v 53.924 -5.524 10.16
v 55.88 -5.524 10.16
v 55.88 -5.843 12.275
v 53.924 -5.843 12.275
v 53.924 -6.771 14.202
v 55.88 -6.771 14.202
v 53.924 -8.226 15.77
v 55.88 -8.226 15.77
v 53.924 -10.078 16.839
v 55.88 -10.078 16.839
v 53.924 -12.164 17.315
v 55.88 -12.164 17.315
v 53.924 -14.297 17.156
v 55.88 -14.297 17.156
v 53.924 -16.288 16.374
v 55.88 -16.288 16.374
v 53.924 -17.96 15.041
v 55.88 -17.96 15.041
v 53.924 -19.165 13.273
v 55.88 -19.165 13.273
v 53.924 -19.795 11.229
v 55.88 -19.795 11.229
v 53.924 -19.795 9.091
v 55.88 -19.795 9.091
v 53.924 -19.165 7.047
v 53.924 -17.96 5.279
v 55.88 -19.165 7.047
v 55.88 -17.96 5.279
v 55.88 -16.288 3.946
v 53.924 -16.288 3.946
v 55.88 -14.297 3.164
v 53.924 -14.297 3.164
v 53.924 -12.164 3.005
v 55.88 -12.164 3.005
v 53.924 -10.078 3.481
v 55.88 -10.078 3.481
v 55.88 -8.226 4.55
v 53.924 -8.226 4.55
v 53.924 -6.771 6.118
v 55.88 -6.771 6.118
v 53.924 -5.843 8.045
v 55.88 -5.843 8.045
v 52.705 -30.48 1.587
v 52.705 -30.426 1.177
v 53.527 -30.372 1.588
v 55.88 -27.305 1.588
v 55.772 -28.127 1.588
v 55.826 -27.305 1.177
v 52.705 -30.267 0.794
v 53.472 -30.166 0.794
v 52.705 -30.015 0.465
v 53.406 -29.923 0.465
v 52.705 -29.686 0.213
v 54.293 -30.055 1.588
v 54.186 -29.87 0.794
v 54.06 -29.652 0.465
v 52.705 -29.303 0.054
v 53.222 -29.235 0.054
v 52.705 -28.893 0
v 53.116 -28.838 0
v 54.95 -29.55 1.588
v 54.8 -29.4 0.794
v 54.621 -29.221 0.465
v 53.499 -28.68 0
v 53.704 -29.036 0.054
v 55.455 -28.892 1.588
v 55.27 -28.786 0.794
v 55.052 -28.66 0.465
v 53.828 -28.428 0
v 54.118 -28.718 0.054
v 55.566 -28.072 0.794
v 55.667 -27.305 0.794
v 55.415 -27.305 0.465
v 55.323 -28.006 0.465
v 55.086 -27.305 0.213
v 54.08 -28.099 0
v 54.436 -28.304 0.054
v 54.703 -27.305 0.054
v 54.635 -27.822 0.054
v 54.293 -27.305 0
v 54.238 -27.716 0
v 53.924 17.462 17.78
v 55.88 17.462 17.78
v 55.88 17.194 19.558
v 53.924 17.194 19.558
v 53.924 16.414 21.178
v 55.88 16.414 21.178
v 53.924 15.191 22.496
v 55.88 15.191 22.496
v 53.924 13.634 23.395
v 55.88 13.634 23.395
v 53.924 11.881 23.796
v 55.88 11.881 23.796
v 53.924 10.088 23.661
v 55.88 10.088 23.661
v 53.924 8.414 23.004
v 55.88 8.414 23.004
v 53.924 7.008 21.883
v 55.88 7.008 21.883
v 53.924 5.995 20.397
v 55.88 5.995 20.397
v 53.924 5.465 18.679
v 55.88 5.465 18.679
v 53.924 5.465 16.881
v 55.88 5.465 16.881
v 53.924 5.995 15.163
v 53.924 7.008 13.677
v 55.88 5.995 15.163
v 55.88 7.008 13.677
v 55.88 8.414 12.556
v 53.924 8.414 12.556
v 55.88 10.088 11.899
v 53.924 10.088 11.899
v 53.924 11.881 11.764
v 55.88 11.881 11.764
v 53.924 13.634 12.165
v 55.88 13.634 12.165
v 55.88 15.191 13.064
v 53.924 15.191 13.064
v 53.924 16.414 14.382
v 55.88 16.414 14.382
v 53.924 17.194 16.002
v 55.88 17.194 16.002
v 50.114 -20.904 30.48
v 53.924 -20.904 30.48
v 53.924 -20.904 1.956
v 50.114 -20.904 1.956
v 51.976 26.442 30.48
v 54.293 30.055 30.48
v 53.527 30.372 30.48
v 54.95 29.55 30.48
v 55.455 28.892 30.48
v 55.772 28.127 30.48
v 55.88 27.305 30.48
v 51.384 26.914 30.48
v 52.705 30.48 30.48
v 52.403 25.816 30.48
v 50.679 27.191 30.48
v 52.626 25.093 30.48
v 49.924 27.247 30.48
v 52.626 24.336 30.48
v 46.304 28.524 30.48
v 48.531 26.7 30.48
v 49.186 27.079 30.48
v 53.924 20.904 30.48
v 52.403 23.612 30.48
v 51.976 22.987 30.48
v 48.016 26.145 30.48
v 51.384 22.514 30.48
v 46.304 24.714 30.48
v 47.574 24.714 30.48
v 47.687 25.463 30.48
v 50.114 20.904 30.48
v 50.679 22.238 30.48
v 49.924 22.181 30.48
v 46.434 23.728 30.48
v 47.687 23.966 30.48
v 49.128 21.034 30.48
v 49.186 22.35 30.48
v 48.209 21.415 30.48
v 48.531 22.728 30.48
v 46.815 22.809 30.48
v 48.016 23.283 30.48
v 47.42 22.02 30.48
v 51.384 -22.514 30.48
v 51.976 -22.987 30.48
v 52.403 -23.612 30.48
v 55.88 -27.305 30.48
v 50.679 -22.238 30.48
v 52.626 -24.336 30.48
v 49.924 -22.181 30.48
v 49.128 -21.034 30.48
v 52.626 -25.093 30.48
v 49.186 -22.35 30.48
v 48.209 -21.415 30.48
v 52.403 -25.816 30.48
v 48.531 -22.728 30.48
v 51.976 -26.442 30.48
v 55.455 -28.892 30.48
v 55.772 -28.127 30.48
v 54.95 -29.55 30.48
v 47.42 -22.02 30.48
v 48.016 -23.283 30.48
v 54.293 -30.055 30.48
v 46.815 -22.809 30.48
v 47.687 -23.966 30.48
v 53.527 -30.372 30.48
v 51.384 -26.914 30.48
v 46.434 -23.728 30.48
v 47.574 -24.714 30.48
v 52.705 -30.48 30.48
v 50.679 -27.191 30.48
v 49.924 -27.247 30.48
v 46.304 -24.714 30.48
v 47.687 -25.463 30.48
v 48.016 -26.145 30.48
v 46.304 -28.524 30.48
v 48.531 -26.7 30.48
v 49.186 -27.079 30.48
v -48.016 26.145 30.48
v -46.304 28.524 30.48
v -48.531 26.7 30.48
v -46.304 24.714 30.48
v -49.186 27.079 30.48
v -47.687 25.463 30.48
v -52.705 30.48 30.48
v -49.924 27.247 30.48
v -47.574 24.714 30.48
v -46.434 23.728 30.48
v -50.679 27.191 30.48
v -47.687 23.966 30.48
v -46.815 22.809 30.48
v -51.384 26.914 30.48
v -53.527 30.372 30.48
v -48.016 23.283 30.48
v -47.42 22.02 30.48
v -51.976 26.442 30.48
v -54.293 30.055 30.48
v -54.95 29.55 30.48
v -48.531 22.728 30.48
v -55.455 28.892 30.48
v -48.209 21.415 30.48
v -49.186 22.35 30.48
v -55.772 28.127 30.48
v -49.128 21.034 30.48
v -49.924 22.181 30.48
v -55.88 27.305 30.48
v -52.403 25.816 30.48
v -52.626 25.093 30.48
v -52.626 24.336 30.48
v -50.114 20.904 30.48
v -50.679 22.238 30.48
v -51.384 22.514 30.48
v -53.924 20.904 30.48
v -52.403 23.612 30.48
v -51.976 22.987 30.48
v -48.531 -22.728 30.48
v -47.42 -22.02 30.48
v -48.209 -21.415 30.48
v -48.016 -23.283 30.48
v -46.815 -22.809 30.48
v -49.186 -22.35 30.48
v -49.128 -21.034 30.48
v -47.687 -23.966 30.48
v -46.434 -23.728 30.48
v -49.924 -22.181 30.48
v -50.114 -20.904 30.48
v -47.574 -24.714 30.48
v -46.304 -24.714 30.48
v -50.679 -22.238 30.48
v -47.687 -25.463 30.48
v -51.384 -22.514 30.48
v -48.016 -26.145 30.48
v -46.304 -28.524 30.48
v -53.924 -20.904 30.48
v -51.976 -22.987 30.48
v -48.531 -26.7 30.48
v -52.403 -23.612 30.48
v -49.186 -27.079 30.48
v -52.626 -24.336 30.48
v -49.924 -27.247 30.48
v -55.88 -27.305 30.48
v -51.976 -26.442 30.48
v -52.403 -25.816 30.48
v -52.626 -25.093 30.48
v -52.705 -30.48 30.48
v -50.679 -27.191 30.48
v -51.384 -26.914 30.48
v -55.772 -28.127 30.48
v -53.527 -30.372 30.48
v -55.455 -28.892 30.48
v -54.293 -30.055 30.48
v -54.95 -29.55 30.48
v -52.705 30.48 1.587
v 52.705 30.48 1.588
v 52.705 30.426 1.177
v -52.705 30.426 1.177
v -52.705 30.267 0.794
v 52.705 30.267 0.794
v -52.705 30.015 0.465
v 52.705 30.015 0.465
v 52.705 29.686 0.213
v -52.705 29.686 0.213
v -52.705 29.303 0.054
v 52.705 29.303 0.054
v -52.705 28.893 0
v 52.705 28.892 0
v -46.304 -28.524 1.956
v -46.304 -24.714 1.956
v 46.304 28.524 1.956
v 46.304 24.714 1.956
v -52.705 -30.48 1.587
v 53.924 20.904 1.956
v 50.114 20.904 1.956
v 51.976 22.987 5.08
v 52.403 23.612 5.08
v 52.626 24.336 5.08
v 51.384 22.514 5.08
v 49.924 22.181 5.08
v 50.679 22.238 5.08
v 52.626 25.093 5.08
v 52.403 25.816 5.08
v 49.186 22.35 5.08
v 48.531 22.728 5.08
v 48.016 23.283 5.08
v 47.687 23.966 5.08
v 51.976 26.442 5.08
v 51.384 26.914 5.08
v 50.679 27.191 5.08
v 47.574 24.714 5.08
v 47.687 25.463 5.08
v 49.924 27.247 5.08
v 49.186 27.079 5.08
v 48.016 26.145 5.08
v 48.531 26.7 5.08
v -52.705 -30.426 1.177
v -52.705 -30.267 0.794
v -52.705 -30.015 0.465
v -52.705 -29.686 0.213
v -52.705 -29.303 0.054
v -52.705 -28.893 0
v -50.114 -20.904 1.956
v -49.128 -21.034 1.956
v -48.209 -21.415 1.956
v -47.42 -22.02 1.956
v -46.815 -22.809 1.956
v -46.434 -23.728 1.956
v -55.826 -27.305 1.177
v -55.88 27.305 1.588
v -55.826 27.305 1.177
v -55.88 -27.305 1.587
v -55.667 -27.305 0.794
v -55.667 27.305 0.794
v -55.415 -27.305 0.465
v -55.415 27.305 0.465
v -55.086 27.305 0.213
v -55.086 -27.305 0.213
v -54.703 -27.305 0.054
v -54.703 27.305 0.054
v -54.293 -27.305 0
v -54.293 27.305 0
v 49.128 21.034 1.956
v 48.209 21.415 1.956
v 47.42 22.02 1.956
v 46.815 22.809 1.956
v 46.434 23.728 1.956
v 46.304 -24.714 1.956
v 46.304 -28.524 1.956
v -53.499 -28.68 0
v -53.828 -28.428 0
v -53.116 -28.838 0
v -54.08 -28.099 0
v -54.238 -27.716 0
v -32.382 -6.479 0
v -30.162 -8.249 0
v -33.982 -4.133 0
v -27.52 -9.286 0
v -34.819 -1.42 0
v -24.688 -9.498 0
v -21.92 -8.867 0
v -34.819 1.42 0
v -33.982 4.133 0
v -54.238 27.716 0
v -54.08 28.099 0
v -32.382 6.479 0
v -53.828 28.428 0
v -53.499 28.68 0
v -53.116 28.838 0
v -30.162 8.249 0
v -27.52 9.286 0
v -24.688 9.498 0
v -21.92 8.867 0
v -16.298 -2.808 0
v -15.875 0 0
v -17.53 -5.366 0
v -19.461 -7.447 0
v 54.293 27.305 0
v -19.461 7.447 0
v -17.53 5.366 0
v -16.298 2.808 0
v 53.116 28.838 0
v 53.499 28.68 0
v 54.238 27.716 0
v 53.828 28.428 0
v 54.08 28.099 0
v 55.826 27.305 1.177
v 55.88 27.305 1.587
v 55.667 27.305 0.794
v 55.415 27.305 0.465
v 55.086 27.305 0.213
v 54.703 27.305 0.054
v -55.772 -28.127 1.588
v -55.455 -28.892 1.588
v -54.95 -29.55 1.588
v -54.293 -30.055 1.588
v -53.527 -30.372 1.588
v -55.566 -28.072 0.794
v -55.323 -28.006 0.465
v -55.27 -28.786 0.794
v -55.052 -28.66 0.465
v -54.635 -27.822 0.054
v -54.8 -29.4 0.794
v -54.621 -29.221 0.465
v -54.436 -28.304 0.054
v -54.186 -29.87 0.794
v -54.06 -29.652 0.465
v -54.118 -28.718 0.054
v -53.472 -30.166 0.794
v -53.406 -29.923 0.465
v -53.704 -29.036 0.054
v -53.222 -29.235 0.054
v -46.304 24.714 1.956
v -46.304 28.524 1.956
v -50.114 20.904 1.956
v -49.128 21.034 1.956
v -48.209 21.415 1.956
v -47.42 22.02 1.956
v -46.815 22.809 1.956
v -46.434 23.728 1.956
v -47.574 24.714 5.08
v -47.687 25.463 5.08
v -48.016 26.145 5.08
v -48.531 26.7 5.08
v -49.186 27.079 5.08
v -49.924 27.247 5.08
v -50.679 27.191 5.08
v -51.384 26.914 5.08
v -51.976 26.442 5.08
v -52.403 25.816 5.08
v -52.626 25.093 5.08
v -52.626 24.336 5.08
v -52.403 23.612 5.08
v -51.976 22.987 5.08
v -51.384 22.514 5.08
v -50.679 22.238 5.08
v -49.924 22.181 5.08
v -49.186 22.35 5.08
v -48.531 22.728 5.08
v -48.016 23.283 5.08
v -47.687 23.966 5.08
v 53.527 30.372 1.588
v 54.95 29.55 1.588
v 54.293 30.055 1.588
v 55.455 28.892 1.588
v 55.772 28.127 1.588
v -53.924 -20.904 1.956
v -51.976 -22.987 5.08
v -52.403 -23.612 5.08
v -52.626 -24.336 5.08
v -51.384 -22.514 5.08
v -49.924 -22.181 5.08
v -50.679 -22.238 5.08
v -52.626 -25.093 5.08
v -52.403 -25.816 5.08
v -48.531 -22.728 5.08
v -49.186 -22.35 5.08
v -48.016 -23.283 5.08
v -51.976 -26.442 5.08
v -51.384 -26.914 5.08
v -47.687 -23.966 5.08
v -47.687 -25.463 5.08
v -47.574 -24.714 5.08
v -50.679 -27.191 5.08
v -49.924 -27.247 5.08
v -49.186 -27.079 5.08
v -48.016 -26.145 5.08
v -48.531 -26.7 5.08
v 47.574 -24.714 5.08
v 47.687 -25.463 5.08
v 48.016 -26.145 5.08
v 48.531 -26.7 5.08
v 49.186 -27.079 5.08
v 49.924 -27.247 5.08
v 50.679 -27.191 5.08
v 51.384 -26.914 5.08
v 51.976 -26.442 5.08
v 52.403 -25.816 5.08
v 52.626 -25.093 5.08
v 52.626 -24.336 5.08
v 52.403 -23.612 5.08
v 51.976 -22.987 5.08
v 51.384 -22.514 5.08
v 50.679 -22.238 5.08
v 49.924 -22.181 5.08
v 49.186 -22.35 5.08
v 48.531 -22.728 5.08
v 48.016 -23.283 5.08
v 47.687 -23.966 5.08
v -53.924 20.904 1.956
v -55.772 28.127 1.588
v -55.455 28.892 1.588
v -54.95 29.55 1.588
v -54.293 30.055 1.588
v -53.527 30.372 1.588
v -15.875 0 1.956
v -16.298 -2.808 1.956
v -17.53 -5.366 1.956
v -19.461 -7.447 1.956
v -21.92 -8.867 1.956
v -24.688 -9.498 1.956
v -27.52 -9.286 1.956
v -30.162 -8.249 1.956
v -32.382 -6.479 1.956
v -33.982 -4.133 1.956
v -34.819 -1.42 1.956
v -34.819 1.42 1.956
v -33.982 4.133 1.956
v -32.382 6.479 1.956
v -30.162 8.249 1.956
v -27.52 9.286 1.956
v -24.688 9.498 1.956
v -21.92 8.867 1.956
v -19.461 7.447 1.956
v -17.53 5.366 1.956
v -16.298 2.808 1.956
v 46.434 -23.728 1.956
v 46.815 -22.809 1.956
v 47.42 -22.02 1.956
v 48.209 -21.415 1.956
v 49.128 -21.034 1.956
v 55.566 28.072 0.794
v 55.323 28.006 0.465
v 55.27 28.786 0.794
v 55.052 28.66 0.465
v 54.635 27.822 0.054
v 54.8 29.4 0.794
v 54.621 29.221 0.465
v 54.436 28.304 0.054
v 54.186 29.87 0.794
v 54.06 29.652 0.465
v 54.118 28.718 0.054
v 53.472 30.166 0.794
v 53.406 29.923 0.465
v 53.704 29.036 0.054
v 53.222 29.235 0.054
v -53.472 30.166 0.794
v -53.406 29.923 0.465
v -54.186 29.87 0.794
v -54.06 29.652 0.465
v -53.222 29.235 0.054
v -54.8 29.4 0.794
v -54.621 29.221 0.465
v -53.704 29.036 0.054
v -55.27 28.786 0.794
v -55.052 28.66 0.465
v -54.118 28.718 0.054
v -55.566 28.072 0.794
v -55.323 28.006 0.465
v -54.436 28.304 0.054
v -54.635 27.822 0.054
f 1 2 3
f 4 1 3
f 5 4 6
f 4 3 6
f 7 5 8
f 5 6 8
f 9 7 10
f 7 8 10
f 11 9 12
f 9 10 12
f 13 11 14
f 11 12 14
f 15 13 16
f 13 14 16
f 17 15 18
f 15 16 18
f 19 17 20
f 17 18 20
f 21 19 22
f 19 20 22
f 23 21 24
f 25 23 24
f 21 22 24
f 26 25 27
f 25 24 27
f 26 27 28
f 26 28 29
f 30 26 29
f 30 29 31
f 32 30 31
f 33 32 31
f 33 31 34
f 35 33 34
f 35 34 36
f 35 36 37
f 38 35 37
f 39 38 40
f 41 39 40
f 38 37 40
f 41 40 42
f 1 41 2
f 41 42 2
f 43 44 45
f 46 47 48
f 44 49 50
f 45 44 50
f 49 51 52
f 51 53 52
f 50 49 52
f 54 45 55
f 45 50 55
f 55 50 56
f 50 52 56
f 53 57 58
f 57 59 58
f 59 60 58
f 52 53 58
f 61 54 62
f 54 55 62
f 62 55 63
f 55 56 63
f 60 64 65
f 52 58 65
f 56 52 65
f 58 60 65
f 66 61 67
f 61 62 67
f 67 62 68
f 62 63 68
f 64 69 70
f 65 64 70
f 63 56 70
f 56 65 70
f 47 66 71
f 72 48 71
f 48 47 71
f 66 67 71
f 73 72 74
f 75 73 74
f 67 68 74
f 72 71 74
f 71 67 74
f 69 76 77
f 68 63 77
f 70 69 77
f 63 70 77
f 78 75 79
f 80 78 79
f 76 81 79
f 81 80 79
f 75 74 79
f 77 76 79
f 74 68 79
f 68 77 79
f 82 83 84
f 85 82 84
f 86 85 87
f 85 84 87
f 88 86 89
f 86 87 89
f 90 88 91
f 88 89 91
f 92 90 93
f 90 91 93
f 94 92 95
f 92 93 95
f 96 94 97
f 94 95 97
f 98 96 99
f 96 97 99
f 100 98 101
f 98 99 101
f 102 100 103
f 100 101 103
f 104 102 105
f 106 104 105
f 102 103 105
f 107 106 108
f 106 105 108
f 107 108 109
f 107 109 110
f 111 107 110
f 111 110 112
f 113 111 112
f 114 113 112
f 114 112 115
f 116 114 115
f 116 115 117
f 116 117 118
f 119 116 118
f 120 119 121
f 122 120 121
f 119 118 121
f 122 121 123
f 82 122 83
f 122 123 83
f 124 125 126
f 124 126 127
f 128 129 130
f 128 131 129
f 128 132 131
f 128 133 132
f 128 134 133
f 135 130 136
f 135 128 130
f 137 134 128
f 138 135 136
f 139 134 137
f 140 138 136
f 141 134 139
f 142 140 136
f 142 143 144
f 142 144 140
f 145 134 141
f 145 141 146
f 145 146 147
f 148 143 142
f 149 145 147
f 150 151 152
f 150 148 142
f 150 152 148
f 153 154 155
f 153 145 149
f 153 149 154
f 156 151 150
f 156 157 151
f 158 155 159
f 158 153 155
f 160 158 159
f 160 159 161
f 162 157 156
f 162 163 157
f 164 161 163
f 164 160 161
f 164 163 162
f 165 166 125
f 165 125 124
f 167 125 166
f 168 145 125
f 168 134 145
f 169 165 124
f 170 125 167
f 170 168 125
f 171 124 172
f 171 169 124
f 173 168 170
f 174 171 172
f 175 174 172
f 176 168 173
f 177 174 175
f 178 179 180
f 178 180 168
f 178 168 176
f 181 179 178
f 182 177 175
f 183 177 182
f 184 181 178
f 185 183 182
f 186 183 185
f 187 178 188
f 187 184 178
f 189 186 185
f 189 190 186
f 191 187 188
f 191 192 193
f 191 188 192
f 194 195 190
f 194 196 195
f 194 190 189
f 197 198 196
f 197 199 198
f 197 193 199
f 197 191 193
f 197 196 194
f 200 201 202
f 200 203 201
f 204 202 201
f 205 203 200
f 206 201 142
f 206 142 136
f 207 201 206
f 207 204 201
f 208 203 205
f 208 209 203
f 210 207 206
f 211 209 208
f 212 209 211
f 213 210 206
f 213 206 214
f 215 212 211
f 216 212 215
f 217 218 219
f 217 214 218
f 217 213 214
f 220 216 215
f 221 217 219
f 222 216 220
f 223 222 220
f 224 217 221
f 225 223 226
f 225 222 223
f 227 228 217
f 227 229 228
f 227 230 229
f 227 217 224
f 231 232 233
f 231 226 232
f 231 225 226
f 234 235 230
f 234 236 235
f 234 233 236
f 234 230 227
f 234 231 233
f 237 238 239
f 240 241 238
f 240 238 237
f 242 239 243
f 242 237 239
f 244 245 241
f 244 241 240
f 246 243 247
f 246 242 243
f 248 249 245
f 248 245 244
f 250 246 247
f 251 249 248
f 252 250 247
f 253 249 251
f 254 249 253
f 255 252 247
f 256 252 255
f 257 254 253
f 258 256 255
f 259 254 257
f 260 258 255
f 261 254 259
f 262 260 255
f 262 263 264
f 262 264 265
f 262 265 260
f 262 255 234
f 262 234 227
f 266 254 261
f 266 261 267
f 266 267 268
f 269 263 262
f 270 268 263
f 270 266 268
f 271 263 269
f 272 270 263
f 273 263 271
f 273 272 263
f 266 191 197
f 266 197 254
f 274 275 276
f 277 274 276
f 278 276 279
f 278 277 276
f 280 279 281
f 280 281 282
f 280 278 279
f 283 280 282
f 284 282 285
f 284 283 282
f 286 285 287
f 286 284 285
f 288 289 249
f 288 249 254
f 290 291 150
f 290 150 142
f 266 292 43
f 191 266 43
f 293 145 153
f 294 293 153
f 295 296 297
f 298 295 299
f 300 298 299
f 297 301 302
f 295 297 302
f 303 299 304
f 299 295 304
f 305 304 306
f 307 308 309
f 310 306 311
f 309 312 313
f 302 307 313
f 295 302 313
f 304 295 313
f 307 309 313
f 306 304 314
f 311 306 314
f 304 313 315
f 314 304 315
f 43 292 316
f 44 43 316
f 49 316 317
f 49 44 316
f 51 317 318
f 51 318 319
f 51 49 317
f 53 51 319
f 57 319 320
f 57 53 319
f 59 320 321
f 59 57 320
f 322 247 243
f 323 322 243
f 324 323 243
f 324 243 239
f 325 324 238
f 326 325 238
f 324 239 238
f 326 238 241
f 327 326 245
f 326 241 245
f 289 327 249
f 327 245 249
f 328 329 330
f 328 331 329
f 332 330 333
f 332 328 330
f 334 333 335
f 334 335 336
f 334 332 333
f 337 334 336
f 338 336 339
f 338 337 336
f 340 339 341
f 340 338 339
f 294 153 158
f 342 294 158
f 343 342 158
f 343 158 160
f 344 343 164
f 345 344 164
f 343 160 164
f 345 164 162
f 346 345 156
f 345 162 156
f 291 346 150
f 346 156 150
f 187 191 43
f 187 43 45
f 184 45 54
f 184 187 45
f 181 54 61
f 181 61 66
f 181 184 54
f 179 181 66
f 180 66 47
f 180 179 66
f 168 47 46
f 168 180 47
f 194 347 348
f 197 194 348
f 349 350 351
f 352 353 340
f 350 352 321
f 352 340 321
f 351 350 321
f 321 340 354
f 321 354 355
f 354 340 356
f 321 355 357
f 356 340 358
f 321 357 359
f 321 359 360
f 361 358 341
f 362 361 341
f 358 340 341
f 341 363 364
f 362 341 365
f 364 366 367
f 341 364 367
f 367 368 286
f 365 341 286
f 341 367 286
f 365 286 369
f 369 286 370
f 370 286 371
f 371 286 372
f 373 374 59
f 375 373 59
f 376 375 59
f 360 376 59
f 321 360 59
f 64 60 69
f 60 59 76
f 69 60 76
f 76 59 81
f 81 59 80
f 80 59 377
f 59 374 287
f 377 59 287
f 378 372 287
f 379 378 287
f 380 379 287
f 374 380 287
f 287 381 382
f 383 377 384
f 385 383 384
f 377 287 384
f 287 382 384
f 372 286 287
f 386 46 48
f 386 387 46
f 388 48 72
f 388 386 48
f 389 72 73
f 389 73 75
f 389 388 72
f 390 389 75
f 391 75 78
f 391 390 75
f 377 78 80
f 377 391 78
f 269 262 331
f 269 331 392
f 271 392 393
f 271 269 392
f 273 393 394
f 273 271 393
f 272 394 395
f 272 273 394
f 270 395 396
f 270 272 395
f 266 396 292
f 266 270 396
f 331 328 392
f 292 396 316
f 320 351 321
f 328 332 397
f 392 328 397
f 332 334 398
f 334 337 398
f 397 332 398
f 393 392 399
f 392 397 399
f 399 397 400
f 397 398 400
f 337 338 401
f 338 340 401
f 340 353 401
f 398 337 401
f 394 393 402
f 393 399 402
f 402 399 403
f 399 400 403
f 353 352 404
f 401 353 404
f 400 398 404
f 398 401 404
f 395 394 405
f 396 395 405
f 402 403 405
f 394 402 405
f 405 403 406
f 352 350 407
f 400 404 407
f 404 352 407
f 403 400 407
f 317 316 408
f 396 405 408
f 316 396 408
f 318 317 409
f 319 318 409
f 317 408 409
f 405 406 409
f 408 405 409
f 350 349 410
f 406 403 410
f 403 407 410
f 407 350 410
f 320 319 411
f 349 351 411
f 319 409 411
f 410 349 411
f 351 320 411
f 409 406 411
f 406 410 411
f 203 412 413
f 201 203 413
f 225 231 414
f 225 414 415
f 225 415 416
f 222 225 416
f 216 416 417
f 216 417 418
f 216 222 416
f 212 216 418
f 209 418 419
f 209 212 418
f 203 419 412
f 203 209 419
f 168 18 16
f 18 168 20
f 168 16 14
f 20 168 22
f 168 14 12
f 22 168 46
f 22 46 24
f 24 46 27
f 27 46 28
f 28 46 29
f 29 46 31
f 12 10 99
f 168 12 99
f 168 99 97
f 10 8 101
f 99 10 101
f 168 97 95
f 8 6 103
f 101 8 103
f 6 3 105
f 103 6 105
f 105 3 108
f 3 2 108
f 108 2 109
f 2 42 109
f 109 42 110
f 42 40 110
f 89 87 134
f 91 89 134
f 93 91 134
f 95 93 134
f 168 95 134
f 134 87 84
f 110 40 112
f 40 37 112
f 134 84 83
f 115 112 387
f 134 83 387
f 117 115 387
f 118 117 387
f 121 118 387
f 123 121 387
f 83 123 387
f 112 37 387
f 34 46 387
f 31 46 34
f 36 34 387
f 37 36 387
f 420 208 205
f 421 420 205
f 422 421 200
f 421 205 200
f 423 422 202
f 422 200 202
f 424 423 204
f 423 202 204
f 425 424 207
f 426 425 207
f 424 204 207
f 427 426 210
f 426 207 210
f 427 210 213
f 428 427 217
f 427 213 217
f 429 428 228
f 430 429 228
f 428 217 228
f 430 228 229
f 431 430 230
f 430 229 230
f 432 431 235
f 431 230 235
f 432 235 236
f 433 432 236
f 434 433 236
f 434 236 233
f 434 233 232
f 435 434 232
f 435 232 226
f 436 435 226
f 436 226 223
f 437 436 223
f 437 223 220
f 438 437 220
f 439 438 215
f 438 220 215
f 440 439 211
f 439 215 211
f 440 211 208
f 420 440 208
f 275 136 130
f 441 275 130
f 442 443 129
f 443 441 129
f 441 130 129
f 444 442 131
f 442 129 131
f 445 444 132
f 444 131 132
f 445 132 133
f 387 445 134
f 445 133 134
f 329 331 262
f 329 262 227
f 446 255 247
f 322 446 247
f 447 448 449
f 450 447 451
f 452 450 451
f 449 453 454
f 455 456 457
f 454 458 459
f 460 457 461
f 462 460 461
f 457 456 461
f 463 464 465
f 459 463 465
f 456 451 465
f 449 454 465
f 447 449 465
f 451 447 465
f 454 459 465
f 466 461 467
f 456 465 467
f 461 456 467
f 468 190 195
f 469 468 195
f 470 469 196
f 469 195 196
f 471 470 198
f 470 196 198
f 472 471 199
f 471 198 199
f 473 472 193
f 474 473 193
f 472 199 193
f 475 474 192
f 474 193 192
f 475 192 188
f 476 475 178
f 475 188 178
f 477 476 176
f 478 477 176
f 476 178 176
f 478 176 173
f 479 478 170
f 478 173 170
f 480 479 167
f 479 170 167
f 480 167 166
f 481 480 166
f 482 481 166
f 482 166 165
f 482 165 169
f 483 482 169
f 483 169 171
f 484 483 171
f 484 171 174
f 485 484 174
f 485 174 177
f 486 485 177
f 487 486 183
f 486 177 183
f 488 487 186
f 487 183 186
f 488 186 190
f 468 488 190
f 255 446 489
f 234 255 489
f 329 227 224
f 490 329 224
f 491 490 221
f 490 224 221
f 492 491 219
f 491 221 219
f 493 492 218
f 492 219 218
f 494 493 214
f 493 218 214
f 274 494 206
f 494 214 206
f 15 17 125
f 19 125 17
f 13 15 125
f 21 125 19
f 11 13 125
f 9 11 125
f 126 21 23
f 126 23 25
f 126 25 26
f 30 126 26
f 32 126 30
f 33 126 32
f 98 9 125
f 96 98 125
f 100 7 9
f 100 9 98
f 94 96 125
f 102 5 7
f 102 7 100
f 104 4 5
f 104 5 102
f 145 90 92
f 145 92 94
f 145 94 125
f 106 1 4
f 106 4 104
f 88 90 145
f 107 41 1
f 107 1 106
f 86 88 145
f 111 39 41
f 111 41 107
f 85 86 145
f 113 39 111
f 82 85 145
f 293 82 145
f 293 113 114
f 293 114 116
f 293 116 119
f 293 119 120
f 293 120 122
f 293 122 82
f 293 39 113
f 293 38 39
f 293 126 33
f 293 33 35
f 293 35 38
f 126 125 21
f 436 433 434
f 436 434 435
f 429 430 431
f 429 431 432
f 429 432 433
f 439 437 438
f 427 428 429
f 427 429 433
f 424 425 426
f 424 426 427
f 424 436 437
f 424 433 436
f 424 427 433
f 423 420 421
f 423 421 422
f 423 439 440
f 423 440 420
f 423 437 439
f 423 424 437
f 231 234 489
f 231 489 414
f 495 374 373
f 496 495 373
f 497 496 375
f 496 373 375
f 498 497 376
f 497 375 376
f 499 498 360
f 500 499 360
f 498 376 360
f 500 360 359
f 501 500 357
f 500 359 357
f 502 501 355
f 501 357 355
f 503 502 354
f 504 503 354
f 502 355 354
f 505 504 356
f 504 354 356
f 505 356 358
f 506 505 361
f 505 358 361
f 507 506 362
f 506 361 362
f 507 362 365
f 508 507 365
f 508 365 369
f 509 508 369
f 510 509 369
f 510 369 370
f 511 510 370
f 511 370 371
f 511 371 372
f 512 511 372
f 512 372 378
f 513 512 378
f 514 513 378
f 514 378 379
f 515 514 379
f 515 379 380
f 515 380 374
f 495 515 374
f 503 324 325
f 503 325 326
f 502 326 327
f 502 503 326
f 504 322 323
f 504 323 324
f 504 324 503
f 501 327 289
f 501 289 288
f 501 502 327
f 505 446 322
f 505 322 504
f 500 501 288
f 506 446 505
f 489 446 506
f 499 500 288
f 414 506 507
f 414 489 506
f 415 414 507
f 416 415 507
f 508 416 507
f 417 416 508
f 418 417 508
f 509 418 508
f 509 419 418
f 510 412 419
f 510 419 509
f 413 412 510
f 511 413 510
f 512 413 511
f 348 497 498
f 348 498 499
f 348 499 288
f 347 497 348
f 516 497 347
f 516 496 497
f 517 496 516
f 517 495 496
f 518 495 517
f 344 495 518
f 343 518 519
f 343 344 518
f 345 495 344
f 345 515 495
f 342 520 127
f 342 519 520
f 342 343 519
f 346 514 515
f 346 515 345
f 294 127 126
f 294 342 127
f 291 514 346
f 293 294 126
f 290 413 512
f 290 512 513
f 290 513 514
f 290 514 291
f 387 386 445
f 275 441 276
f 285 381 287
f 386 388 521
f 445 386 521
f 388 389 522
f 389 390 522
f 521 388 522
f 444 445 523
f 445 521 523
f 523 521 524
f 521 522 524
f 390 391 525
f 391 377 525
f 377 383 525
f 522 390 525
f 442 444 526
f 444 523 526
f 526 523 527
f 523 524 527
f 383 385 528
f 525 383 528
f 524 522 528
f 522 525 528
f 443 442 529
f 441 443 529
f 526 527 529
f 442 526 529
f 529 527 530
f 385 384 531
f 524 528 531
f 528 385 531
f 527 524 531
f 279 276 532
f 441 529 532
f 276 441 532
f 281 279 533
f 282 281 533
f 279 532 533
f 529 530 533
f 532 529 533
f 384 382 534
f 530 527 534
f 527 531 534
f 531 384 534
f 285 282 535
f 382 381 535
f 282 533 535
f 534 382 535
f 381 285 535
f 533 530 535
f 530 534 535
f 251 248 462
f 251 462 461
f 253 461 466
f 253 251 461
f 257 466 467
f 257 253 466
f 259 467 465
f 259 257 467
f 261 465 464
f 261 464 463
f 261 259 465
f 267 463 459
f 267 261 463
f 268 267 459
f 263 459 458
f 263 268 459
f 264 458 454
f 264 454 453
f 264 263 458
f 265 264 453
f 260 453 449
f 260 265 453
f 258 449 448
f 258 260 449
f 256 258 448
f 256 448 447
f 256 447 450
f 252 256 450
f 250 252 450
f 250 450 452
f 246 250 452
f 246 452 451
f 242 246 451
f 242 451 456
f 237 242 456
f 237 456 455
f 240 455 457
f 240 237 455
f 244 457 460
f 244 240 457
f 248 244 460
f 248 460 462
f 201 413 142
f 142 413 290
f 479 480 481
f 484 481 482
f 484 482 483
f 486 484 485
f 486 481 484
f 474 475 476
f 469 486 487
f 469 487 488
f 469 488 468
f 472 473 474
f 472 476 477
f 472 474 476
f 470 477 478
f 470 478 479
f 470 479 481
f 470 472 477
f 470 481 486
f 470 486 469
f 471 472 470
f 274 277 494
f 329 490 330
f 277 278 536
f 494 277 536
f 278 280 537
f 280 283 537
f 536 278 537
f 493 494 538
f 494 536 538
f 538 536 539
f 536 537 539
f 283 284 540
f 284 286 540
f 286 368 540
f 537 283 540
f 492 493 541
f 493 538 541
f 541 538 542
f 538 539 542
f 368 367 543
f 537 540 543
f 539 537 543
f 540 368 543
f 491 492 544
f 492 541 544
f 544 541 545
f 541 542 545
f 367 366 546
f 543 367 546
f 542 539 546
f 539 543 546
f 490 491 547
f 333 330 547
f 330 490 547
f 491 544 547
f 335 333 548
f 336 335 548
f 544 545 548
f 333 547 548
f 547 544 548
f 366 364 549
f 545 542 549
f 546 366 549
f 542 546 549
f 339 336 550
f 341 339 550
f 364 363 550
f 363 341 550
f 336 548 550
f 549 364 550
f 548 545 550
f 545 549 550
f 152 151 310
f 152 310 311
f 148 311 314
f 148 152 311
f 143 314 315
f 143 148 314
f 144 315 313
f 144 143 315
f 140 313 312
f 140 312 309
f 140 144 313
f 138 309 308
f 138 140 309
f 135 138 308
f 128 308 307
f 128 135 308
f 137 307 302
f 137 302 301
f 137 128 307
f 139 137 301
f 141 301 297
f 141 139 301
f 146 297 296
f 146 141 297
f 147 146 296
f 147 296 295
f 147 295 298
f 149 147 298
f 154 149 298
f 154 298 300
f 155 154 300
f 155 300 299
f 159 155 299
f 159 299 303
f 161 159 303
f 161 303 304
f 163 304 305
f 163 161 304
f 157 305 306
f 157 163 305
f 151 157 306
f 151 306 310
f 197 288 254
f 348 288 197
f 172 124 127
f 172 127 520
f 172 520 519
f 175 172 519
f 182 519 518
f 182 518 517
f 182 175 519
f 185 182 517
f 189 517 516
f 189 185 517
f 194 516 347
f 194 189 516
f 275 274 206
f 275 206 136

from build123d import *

# Parameters (mm, degrees)
F0_W      = 111.76
F0_H      = 60.96
F1_DEPTH  = 30.48
F2_T      = -1.9558
F4_DEPTH  = 28.5242
F5_R      = 2.54
F6_DEPTH  = 25.4
F9_R      = 3.175
F10_R     = 1.5875
F11_R     = 7.1755
F12_DEPTH = 1.9558
F13_R     = 6.0325
F14_DEPTH = 1.9558
F15_R     = 9.525
F16_DEPTH = 30.481


with BuildPart() as f1:
    # F0 (on Top) → F1 (new body)
    with BuildSketch(Plane.XY):
        Rectangle(F0_W, F0_H)
    extrude(amount=F1_DEPTH)

    # F2
    f2_openings = [f1.faces().sort_by_distance(p)[0] for p in [
        (0, 0, 30.48),
    ]]
    offset(amount=F2_T, openings=f2_openings)

    # F3 (on face) → F4 (join, through all)
    with BuildSketch(Plane.XY.offset(30.48)):
        with BuildLine():
            Line((-53.9242, 20.9042), (-50.1142, 20.9042))
            ThreePointArc((-50.1142, 20.9042), (-47.4201231637, 22.0201231637), (-46.3042, 24.7142))
            Line((-46.3042, 24.7142), (-46.3042, 28.5242))
            Line((-46.3042, 28.5242), (-53.9242, 28.5242))
            Line((-53.9242, 28.5242), (-53.9242, 20.9042))
        make_face()
    extrude(amount=-F4_DEPTH)

    # F5 (on face) → F6 (cut)
    with BuildSketch(Plane.XY.offset(30.48)):
        with Locations((-50.1142, 24.7142)):
            Circle(F5_R)
    extrude(amount=-F6_DEPTH, mode=Mode.SUBTRACT)

    # F7: F1 across plane


with BuildPart() as f1_1:
    add(f1.part)
    add(f1.part.mirror(Plane.YZ))

    # F8: F1 across plane


with BuildPart() as f1_2:
    add(f1_1.part)
    add(f1_1.part.mirror(Plane.XZ))

    # F9
    f9_edges = [f1_2.edges().sort_by_distance(p)[0] for p in [
        (-55.88, 30.48, 15.24),
        (-55.88, -30.48, 15.24),
        (55.88, -30.48, 15.24),
        (55.88, 30.48, 15.24),
    ]]
    fillet(f9_edges, radius=F9_R)

    # F10
    f10_edges = [f1_2.edges().sort_by_distance(p)[0] for p in [
        (0, -30.48, 0),
        (-54.950064, -29.550064, 0),
        (54.950064, -29.550064, 0),
        (-55.88, 0, 0),
        (55.88, 0, 0),
        (-54.950064, 29.550064, 0),
        (54.950064, 29.550064, 0),
        (0, 30.48, 0),
    ]]
    fillet(f10_edges, radius=F10_R)

    # F11 (on face) → F12 (cut, through all)
    with BuildSketch(Plane.YZ.offset(55.88)):
        with Locations((-12.7, 10.16)):
            Circle(F11_R)
    extrude(amount=-F12_DEPTH, mode=Mode.SUBTRACT)

    # F13 (on face) → F14 (cut, through all)
    with BuildSketch(Plane.YZ.offset(55.88)):
        with Locations((11.43, 17.78)):
            Circle(F13_R)
    extrude(amount=-F14_DEPTH, mode=Mode.SUBTRACT)

    # F15 (on face) → F16 (cut, through all)
    with BuildSketch(Plane(origin=(0, 0, 0), x_dir=(1, 0, 0), z_dir=(0, 0, -1))):
        with Locations((-25.4, 0)):
            Circle(F15_R)
    extrude(amount=-F16_DEPTH, mode=Mode.SUBTRACT)


solid = f1_2.part
